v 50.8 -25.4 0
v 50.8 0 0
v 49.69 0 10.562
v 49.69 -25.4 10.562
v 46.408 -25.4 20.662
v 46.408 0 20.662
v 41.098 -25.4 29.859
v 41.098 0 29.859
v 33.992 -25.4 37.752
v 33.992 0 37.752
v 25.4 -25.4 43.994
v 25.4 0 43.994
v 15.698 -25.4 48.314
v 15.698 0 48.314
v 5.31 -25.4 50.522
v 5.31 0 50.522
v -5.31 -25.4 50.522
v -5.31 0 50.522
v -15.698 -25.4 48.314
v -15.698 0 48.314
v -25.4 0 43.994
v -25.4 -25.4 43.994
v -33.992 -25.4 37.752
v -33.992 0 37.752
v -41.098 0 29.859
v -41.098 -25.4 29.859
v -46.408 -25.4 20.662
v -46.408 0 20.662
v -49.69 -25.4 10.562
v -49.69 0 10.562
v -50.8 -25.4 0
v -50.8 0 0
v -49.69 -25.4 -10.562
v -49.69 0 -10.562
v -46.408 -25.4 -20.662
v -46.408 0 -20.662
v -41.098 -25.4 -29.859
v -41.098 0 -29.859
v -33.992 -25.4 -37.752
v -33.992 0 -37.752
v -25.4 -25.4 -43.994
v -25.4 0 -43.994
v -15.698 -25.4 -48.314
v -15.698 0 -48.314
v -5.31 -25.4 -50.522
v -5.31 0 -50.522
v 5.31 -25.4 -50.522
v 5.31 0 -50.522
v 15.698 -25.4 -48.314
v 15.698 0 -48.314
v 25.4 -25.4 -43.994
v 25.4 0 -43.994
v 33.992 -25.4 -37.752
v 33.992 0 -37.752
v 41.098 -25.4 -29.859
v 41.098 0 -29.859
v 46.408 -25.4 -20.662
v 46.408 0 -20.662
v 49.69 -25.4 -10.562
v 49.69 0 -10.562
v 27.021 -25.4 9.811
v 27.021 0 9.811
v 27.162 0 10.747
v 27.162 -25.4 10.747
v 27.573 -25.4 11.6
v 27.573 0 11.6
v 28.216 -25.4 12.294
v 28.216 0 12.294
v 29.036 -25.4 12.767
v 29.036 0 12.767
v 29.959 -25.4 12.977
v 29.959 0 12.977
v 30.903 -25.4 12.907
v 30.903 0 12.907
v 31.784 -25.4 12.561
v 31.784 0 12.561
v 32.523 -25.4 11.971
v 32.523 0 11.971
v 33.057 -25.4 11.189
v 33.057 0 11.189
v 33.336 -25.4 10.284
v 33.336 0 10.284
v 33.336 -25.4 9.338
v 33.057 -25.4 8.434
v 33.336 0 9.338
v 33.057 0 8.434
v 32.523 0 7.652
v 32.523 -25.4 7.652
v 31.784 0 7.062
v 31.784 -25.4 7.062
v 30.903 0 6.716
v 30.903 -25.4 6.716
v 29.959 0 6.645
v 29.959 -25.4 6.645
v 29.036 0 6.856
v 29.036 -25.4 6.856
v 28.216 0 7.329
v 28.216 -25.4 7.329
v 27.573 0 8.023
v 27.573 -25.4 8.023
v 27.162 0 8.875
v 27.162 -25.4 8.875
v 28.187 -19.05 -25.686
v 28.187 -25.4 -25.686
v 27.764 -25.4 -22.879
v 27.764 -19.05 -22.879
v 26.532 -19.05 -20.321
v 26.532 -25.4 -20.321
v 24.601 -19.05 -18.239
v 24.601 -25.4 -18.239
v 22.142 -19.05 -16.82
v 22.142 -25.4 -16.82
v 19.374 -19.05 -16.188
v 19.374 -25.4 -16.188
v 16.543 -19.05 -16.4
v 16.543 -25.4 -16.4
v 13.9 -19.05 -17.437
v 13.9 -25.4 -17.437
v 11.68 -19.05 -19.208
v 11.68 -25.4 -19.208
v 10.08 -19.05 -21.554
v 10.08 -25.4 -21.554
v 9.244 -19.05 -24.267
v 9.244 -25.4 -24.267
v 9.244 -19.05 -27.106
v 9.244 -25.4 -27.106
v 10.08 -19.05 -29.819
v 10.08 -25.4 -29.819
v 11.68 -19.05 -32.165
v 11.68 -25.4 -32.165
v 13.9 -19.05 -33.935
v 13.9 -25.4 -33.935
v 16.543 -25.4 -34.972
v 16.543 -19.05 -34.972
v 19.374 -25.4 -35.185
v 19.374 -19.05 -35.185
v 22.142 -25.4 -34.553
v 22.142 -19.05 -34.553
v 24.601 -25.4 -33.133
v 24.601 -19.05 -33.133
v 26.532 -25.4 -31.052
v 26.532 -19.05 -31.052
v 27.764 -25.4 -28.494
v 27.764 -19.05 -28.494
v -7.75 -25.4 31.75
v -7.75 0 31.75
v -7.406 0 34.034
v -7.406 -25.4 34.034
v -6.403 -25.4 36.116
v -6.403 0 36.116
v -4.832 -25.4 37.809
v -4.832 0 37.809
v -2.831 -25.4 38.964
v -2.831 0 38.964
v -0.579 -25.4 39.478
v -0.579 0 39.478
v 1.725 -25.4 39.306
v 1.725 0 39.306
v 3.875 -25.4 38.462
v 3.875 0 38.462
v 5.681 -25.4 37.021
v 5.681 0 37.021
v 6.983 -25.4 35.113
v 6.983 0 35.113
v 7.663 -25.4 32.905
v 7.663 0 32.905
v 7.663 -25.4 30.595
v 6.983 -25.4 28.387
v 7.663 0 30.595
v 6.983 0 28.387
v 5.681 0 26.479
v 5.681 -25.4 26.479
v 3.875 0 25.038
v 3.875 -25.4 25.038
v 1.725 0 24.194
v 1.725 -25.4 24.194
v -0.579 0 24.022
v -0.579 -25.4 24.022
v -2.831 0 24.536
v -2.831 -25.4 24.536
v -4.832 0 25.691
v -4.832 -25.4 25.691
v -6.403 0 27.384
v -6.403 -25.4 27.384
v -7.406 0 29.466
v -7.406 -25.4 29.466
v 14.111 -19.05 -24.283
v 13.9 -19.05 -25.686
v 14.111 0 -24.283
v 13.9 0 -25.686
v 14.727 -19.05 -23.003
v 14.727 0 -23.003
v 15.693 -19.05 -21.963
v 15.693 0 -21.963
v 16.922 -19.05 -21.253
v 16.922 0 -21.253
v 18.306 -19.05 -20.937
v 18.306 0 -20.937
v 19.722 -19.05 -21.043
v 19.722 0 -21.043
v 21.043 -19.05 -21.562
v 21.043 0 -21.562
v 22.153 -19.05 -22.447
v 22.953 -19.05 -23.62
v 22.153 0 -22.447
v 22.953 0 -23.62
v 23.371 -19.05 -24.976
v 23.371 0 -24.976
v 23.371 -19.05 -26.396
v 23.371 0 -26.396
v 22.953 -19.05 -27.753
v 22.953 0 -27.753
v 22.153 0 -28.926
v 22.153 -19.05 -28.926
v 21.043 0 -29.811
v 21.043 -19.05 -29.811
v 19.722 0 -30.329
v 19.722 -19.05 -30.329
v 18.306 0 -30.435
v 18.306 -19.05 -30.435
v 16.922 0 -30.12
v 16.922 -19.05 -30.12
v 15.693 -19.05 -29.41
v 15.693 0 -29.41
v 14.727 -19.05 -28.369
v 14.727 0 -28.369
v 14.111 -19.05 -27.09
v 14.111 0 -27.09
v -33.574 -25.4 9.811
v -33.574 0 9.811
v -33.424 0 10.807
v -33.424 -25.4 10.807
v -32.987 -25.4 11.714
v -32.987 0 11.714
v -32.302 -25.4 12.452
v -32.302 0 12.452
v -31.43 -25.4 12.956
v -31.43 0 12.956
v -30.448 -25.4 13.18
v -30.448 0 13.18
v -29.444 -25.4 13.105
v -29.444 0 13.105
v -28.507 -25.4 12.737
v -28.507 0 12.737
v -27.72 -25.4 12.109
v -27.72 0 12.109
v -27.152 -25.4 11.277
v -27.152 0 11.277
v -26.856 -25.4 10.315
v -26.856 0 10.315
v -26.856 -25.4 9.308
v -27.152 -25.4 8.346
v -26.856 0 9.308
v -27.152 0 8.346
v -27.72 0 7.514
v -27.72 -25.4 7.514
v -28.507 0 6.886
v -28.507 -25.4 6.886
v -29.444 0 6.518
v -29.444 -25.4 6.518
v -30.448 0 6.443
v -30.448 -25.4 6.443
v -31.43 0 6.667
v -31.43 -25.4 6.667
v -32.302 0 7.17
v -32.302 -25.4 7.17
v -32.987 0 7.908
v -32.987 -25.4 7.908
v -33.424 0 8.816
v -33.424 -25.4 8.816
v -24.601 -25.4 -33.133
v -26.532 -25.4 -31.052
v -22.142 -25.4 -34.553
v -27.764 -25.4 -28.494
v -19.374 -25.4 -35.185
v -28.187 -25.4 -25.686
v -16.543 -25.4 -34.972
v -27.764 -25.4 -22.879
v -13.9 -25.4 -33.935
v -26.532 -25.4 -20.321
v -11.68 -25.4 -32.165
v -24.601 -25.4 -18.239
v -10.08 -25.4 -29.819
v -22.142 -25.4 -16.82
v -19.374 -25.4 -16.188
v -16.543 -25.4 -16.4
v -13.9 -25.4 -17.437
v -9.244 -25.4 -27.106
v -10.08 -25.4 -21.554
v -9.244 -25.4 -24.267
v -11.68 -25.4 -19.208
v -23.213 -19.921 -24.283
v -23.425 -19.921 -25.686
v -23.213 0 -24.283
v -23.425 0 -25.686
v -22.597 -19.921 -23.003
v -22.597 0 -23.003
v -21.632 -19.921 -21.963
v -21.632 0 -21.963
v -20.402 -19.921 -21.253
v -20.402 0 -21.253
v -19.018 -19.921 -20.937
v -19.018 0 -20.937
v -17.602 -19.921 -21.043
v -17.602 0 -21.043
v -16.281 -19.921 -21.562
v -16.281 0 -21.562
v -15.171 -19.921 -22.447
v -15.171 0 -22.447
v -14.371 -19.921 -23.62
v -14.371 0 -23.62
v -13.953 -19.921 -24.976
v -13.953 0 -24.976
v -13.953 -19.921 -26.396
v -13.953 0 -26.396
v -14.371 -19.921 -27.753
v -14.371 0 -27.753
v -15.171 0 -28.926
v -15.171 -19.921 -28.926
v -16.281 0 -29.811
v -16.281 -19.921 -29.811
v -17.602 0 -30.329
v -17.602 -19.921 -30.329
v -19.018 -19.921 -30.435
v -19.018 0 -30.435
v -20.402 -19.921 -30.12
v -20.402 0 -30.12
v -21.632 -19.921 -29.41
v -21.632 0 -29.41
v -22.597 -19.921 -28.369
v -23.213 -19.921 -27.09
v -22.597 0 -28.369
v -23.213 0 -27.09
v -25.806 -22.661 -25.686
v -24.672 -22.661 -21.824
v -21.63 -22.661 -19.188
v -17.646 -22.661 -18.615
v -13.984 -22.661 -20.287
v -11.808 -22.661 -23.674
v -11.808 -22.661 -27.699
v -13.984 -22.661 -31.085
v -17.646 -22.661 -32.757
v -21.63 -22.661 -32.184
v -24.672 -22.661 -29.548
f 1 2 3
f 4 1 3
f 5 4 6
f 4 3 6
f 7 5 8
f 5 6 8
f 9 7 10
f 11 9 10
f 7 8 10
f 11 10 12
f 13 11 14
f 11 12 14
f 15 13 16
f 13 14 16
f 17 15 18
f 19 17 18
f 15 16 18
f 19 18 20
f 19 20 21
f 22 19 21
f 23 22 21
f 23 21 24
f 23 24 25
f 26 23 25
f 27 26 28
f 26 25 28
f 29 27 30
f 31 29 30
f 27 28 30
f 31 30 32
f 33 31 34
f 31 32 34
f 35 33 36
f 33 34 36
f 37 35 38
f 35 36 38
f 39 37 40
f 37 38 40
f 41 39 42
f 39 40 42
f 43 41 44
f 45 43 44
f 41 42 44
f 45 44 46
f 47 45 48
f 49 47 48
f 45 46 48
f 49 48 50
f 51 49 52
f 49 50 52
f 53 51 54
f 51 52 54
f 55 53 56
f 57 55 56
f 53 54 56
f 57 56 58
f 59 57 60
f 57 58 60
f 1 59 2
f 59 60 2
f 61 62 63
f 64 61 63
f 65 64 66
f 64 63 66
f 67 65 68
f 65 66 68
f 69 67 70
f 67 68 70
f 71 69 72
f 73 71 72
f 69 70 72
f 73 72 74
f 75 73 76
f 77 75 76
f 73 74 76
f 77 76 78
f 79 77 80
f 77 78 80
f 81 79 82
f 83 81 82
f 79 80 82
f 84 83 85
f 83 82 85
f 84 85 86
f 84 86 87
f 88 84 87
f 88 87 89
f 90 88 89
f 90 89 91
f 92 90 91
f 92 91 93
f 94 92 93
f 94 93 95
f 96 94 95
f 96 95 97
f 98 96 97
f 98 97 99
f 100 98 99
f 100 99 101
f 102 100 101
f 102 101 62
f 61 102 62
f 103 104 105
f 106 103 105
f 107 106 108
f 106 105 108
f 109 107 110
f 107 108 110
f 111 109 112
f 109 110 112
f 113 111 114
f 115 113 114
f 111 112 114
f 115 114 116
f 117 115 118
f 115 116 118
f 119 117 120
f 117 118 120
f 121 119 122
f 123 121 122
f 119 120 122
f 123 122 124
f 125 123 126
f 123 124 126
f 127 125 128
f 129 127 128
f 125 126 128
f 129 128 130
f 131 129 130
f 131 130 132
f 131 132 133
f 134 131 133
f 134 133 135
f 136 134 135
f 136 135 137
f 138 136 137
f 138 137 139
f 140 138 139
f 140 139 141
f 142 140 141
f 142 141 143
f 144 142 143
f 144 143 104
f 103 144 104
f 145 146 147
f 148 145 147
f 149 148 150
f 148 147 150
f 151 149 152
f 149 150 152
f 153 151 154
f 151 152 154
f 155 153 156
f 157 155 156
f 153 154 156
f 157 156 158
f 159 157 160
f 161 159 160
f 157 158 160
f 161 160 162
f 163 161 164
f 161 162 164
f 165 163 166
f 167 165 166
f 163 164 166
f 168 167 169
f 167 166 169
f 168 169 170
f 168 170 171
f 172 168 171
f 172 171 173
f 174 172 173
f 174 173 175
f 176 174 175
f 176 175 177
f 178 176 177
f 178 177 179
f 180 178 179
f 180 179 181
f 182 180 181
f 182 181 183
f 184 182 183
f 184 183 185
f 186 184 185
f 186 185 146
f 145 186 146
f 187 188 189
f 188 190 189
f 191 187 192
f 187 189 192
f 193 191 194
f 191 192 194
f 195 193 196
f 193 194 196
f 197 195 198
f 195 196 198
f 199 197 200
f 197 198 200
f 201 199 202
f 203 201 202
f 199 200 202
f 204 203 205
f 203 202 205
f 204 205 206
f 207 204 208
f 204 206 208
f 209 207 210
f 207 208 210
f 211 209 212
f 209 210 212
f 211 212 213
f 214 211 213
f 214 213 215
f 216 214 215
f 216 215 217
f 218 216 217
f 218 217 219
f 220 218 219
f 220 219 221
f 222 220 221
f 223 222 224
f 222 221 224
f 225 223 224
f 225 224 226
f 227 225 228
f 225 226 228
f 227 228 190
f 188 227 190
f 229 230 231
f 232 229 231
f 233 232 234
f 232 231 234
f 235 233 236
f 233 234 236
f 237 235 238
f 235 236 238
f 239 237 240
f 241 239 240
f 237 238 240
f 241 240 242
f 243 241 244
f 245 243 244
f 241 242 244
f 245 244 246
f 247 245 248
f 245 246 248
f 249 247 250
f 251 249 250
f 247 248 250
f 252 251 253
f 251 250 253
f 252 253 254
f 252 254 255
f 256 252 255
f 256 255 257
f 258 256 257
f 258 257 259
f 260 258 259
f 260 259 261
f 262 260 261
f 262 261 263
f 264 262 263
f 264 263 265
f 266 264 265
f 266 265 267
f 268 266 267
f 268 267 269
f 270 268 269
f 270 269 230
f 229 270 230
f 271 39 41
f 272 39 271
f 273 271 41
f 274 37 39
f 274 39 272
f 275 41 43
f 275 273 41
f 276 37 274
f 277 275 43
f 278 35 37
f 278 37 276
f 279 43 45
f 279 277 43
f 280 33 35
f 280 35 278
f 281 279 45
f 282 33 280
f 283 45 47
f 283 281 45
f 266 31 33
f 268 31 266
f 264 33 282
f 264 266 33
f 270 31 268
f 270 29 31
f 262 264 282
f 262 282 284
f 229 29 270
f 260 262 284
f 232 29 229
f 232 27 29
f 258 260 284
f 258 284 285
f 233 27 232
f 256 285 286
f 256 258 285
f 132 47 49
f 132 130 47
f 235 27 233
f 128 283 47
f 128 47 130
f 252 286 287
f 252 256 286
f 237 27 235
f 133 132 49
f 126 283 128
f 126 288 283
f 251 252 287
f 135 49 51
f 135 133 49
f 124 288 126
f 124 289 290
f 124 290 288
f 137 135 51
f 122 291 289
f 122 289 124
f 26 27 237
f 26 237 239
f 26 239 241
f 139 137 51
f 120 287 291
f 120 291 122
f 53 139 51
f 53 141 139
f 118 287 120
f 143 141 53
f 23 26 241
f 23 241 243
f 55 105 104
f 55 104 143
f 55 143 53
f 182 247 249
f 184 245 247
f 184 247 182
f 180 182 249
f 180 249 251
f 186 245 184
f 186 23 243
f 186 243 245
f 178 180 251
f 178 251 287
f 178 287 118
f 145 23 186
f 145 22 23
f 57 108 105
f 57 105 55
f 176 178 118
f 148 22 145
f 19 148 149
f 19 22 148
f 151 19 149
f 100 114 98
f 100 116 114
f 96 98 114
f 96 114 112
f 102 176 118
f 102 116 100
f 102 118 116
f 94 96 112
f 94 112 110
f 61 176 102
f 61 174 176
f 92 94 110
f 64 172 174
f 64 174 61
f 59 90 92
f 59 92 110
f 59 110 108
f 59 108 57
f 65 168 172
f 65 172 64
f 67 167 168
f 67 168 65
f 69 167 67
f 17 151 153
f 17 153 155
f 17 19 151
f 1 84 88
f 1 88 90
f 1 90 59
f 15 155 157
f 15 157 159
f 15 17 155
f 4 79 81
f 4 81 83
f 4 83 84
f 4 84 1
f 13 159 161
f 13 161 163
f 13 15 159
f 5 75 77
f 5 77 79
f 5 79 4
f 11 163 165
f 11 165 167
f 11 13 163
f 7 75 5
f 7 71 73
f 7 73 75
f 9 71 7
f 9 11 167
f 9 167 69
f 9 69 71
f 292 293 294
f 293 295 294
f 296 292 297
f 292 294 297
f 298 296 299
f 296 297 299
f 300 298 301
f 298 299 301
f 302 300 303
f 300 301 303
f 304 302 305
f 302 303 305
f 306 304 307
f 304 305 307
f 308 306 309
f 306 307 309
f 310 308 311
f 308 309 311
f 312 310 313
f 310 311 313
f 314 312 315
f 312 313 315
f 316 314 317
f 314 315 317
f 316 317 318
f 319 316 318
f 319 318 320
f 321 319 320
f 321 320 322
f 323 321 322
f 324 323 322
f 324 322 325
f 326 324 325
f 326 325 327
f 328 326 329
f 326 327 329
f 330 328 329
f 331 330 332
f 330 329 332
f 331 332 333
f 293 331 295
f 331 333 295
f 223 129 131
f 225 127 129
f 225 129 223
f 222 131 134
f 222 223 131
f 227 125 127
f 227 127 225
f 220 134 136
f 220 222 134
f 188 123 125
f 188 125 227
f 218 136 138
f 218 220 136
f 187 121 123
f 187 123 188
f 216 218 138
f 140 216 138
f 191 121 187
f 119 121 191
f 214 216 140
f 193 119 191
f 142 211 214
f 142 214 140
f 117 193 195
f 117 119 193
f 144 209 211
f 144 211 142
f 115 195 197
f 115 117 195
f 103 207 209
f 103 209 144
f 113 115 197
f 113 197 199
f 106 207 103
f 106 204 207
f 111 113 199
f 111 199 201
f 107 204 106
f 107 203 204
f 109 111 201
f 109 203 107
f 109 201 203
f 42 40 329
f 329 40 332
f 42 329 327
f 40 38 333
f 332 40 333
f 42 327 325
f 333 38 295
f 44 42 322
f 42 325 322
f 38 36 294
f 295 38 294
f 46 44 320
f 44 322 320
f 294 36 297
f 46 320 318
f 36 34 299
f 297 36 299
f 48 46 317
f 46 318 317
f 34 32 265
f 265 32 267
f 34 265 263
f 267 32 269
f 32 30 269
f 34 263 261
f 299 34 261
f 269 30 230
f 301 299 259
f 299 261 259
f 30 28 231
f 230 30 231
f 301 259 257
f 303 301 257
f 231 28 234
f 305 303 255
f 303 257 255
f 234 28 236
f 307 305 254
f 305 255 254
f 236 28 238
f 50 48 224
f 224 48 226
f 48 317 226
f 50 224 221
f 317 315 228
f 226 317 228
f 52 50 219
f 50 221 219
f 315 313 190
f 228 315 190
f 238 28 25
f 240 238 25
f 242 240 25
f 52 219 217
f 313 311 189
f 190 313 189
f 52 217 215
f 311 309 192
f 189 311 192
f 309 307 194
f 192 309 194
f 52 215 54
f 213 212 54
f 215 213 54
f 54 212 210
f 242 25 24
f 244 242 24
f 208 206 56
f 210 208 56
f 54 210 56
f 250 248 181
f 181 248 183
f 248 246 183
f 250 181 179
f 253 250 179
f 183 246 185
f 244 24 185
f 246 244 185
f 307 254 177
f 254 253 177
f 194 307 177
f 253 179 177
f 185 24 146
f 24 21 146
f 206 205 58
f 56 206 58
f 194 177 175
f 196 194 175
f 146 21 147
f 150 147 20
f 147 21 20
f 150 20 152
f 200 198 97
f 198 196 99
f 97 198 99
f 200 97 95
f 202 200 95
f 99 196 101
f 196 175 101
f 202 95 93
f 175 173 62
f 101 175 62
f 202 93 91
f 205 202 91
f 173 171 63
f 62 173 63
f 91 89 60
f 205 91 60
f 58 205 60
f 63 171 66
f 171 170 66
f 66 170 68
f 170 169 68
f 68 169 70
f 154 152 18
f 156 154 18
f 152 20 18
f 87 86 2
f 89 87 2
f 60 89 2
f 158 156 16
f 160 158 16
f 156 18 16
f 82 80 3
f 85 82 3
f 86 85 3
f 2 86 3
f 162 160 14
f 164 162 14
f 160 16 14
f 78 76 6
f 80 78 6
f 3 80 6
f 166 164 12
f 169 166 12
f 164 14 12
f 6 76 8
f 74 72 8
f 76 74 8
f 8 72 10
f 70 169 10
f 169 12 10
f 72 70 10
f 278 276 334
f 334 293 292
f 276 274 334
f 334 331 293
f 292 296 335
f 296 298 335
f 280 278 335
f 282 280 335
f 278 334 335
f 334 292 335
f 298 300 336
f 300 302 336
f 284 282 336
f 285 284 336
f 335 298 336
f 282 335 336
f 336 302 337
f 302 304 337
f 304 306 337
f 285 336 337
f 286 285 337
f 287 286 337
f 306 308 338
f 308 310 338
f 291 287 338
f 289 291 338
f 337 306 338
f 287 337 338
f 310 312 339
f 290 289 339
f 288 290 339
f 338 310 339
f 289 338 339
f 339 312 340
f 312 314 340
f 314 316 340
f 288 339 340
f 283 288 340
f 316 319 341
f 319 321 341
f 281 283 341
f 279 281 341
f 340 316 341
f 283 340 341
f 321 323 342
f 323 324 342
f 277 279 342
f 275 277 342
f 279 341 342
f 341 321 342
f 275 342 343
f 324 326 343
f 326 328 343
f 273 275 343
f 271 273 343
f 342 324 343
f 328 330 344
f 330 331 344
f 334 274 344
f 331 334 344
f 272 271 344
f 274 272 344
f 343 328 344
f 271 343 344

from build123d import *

# Parameters (mm, degrees)
F0_R           = 50.8
F1_DEPTH       = 25.4
F3_D           = 6.35
F4_D           = 9.525
F4_CBORE_D     = 19.05
F4_CBORE_DEPTH = 6.35
F5_D           = 9.525
F5_CSINK_D     = 19.05
F5_CSINK_ANGLE = 82
F6_D           = 6.7564
F7_D           = 15.5


with BuildPart() as f1:
    # F0 (on Front) → F1 (new body)
    with BuildSketch(Plane.XZ):
        Circle(F0_R)
    extrude(amount=F1_DEPTH)

    # F3 (through all)
    with Locations(Plane.XZ.offset(25.4)):
        with Locations((30.1960443924, 9.8112895714)):
            Hole(F3_D / 2)

    # F4 (through all)
    with Locations(Plane.XZ.offset(25.4)):
        with Locations((18.6621817603, -25.6862895714)):
            CounterBoreHole(F4_D / 2, F4_CBORE_D / 2, F4_CBORE_DEPTH)

    # F5 (through all)
    with Locations(Plane.XZ.offset(25.4)):
        with Locations((-18.6621817603, -25.6862895714)):
            CounterSinkHole(F5_D / 2, F5_CSINK_D / 2, counter_sink_angle=F5_CSINK_ANGLE)

    # F6 (through all)
    with Locations(Plane.XZ.offset(25.4)):
        with Locations((-30.1960443924, 9.8112895714)):
            Hole(F6_D / 2)

    # F7 (through all)
    with Locations(Plane.XZ.offset(25.4)):
        with Locations((0, 31.75)):
            Hole(F7_D / 2)


solid = f1.part
